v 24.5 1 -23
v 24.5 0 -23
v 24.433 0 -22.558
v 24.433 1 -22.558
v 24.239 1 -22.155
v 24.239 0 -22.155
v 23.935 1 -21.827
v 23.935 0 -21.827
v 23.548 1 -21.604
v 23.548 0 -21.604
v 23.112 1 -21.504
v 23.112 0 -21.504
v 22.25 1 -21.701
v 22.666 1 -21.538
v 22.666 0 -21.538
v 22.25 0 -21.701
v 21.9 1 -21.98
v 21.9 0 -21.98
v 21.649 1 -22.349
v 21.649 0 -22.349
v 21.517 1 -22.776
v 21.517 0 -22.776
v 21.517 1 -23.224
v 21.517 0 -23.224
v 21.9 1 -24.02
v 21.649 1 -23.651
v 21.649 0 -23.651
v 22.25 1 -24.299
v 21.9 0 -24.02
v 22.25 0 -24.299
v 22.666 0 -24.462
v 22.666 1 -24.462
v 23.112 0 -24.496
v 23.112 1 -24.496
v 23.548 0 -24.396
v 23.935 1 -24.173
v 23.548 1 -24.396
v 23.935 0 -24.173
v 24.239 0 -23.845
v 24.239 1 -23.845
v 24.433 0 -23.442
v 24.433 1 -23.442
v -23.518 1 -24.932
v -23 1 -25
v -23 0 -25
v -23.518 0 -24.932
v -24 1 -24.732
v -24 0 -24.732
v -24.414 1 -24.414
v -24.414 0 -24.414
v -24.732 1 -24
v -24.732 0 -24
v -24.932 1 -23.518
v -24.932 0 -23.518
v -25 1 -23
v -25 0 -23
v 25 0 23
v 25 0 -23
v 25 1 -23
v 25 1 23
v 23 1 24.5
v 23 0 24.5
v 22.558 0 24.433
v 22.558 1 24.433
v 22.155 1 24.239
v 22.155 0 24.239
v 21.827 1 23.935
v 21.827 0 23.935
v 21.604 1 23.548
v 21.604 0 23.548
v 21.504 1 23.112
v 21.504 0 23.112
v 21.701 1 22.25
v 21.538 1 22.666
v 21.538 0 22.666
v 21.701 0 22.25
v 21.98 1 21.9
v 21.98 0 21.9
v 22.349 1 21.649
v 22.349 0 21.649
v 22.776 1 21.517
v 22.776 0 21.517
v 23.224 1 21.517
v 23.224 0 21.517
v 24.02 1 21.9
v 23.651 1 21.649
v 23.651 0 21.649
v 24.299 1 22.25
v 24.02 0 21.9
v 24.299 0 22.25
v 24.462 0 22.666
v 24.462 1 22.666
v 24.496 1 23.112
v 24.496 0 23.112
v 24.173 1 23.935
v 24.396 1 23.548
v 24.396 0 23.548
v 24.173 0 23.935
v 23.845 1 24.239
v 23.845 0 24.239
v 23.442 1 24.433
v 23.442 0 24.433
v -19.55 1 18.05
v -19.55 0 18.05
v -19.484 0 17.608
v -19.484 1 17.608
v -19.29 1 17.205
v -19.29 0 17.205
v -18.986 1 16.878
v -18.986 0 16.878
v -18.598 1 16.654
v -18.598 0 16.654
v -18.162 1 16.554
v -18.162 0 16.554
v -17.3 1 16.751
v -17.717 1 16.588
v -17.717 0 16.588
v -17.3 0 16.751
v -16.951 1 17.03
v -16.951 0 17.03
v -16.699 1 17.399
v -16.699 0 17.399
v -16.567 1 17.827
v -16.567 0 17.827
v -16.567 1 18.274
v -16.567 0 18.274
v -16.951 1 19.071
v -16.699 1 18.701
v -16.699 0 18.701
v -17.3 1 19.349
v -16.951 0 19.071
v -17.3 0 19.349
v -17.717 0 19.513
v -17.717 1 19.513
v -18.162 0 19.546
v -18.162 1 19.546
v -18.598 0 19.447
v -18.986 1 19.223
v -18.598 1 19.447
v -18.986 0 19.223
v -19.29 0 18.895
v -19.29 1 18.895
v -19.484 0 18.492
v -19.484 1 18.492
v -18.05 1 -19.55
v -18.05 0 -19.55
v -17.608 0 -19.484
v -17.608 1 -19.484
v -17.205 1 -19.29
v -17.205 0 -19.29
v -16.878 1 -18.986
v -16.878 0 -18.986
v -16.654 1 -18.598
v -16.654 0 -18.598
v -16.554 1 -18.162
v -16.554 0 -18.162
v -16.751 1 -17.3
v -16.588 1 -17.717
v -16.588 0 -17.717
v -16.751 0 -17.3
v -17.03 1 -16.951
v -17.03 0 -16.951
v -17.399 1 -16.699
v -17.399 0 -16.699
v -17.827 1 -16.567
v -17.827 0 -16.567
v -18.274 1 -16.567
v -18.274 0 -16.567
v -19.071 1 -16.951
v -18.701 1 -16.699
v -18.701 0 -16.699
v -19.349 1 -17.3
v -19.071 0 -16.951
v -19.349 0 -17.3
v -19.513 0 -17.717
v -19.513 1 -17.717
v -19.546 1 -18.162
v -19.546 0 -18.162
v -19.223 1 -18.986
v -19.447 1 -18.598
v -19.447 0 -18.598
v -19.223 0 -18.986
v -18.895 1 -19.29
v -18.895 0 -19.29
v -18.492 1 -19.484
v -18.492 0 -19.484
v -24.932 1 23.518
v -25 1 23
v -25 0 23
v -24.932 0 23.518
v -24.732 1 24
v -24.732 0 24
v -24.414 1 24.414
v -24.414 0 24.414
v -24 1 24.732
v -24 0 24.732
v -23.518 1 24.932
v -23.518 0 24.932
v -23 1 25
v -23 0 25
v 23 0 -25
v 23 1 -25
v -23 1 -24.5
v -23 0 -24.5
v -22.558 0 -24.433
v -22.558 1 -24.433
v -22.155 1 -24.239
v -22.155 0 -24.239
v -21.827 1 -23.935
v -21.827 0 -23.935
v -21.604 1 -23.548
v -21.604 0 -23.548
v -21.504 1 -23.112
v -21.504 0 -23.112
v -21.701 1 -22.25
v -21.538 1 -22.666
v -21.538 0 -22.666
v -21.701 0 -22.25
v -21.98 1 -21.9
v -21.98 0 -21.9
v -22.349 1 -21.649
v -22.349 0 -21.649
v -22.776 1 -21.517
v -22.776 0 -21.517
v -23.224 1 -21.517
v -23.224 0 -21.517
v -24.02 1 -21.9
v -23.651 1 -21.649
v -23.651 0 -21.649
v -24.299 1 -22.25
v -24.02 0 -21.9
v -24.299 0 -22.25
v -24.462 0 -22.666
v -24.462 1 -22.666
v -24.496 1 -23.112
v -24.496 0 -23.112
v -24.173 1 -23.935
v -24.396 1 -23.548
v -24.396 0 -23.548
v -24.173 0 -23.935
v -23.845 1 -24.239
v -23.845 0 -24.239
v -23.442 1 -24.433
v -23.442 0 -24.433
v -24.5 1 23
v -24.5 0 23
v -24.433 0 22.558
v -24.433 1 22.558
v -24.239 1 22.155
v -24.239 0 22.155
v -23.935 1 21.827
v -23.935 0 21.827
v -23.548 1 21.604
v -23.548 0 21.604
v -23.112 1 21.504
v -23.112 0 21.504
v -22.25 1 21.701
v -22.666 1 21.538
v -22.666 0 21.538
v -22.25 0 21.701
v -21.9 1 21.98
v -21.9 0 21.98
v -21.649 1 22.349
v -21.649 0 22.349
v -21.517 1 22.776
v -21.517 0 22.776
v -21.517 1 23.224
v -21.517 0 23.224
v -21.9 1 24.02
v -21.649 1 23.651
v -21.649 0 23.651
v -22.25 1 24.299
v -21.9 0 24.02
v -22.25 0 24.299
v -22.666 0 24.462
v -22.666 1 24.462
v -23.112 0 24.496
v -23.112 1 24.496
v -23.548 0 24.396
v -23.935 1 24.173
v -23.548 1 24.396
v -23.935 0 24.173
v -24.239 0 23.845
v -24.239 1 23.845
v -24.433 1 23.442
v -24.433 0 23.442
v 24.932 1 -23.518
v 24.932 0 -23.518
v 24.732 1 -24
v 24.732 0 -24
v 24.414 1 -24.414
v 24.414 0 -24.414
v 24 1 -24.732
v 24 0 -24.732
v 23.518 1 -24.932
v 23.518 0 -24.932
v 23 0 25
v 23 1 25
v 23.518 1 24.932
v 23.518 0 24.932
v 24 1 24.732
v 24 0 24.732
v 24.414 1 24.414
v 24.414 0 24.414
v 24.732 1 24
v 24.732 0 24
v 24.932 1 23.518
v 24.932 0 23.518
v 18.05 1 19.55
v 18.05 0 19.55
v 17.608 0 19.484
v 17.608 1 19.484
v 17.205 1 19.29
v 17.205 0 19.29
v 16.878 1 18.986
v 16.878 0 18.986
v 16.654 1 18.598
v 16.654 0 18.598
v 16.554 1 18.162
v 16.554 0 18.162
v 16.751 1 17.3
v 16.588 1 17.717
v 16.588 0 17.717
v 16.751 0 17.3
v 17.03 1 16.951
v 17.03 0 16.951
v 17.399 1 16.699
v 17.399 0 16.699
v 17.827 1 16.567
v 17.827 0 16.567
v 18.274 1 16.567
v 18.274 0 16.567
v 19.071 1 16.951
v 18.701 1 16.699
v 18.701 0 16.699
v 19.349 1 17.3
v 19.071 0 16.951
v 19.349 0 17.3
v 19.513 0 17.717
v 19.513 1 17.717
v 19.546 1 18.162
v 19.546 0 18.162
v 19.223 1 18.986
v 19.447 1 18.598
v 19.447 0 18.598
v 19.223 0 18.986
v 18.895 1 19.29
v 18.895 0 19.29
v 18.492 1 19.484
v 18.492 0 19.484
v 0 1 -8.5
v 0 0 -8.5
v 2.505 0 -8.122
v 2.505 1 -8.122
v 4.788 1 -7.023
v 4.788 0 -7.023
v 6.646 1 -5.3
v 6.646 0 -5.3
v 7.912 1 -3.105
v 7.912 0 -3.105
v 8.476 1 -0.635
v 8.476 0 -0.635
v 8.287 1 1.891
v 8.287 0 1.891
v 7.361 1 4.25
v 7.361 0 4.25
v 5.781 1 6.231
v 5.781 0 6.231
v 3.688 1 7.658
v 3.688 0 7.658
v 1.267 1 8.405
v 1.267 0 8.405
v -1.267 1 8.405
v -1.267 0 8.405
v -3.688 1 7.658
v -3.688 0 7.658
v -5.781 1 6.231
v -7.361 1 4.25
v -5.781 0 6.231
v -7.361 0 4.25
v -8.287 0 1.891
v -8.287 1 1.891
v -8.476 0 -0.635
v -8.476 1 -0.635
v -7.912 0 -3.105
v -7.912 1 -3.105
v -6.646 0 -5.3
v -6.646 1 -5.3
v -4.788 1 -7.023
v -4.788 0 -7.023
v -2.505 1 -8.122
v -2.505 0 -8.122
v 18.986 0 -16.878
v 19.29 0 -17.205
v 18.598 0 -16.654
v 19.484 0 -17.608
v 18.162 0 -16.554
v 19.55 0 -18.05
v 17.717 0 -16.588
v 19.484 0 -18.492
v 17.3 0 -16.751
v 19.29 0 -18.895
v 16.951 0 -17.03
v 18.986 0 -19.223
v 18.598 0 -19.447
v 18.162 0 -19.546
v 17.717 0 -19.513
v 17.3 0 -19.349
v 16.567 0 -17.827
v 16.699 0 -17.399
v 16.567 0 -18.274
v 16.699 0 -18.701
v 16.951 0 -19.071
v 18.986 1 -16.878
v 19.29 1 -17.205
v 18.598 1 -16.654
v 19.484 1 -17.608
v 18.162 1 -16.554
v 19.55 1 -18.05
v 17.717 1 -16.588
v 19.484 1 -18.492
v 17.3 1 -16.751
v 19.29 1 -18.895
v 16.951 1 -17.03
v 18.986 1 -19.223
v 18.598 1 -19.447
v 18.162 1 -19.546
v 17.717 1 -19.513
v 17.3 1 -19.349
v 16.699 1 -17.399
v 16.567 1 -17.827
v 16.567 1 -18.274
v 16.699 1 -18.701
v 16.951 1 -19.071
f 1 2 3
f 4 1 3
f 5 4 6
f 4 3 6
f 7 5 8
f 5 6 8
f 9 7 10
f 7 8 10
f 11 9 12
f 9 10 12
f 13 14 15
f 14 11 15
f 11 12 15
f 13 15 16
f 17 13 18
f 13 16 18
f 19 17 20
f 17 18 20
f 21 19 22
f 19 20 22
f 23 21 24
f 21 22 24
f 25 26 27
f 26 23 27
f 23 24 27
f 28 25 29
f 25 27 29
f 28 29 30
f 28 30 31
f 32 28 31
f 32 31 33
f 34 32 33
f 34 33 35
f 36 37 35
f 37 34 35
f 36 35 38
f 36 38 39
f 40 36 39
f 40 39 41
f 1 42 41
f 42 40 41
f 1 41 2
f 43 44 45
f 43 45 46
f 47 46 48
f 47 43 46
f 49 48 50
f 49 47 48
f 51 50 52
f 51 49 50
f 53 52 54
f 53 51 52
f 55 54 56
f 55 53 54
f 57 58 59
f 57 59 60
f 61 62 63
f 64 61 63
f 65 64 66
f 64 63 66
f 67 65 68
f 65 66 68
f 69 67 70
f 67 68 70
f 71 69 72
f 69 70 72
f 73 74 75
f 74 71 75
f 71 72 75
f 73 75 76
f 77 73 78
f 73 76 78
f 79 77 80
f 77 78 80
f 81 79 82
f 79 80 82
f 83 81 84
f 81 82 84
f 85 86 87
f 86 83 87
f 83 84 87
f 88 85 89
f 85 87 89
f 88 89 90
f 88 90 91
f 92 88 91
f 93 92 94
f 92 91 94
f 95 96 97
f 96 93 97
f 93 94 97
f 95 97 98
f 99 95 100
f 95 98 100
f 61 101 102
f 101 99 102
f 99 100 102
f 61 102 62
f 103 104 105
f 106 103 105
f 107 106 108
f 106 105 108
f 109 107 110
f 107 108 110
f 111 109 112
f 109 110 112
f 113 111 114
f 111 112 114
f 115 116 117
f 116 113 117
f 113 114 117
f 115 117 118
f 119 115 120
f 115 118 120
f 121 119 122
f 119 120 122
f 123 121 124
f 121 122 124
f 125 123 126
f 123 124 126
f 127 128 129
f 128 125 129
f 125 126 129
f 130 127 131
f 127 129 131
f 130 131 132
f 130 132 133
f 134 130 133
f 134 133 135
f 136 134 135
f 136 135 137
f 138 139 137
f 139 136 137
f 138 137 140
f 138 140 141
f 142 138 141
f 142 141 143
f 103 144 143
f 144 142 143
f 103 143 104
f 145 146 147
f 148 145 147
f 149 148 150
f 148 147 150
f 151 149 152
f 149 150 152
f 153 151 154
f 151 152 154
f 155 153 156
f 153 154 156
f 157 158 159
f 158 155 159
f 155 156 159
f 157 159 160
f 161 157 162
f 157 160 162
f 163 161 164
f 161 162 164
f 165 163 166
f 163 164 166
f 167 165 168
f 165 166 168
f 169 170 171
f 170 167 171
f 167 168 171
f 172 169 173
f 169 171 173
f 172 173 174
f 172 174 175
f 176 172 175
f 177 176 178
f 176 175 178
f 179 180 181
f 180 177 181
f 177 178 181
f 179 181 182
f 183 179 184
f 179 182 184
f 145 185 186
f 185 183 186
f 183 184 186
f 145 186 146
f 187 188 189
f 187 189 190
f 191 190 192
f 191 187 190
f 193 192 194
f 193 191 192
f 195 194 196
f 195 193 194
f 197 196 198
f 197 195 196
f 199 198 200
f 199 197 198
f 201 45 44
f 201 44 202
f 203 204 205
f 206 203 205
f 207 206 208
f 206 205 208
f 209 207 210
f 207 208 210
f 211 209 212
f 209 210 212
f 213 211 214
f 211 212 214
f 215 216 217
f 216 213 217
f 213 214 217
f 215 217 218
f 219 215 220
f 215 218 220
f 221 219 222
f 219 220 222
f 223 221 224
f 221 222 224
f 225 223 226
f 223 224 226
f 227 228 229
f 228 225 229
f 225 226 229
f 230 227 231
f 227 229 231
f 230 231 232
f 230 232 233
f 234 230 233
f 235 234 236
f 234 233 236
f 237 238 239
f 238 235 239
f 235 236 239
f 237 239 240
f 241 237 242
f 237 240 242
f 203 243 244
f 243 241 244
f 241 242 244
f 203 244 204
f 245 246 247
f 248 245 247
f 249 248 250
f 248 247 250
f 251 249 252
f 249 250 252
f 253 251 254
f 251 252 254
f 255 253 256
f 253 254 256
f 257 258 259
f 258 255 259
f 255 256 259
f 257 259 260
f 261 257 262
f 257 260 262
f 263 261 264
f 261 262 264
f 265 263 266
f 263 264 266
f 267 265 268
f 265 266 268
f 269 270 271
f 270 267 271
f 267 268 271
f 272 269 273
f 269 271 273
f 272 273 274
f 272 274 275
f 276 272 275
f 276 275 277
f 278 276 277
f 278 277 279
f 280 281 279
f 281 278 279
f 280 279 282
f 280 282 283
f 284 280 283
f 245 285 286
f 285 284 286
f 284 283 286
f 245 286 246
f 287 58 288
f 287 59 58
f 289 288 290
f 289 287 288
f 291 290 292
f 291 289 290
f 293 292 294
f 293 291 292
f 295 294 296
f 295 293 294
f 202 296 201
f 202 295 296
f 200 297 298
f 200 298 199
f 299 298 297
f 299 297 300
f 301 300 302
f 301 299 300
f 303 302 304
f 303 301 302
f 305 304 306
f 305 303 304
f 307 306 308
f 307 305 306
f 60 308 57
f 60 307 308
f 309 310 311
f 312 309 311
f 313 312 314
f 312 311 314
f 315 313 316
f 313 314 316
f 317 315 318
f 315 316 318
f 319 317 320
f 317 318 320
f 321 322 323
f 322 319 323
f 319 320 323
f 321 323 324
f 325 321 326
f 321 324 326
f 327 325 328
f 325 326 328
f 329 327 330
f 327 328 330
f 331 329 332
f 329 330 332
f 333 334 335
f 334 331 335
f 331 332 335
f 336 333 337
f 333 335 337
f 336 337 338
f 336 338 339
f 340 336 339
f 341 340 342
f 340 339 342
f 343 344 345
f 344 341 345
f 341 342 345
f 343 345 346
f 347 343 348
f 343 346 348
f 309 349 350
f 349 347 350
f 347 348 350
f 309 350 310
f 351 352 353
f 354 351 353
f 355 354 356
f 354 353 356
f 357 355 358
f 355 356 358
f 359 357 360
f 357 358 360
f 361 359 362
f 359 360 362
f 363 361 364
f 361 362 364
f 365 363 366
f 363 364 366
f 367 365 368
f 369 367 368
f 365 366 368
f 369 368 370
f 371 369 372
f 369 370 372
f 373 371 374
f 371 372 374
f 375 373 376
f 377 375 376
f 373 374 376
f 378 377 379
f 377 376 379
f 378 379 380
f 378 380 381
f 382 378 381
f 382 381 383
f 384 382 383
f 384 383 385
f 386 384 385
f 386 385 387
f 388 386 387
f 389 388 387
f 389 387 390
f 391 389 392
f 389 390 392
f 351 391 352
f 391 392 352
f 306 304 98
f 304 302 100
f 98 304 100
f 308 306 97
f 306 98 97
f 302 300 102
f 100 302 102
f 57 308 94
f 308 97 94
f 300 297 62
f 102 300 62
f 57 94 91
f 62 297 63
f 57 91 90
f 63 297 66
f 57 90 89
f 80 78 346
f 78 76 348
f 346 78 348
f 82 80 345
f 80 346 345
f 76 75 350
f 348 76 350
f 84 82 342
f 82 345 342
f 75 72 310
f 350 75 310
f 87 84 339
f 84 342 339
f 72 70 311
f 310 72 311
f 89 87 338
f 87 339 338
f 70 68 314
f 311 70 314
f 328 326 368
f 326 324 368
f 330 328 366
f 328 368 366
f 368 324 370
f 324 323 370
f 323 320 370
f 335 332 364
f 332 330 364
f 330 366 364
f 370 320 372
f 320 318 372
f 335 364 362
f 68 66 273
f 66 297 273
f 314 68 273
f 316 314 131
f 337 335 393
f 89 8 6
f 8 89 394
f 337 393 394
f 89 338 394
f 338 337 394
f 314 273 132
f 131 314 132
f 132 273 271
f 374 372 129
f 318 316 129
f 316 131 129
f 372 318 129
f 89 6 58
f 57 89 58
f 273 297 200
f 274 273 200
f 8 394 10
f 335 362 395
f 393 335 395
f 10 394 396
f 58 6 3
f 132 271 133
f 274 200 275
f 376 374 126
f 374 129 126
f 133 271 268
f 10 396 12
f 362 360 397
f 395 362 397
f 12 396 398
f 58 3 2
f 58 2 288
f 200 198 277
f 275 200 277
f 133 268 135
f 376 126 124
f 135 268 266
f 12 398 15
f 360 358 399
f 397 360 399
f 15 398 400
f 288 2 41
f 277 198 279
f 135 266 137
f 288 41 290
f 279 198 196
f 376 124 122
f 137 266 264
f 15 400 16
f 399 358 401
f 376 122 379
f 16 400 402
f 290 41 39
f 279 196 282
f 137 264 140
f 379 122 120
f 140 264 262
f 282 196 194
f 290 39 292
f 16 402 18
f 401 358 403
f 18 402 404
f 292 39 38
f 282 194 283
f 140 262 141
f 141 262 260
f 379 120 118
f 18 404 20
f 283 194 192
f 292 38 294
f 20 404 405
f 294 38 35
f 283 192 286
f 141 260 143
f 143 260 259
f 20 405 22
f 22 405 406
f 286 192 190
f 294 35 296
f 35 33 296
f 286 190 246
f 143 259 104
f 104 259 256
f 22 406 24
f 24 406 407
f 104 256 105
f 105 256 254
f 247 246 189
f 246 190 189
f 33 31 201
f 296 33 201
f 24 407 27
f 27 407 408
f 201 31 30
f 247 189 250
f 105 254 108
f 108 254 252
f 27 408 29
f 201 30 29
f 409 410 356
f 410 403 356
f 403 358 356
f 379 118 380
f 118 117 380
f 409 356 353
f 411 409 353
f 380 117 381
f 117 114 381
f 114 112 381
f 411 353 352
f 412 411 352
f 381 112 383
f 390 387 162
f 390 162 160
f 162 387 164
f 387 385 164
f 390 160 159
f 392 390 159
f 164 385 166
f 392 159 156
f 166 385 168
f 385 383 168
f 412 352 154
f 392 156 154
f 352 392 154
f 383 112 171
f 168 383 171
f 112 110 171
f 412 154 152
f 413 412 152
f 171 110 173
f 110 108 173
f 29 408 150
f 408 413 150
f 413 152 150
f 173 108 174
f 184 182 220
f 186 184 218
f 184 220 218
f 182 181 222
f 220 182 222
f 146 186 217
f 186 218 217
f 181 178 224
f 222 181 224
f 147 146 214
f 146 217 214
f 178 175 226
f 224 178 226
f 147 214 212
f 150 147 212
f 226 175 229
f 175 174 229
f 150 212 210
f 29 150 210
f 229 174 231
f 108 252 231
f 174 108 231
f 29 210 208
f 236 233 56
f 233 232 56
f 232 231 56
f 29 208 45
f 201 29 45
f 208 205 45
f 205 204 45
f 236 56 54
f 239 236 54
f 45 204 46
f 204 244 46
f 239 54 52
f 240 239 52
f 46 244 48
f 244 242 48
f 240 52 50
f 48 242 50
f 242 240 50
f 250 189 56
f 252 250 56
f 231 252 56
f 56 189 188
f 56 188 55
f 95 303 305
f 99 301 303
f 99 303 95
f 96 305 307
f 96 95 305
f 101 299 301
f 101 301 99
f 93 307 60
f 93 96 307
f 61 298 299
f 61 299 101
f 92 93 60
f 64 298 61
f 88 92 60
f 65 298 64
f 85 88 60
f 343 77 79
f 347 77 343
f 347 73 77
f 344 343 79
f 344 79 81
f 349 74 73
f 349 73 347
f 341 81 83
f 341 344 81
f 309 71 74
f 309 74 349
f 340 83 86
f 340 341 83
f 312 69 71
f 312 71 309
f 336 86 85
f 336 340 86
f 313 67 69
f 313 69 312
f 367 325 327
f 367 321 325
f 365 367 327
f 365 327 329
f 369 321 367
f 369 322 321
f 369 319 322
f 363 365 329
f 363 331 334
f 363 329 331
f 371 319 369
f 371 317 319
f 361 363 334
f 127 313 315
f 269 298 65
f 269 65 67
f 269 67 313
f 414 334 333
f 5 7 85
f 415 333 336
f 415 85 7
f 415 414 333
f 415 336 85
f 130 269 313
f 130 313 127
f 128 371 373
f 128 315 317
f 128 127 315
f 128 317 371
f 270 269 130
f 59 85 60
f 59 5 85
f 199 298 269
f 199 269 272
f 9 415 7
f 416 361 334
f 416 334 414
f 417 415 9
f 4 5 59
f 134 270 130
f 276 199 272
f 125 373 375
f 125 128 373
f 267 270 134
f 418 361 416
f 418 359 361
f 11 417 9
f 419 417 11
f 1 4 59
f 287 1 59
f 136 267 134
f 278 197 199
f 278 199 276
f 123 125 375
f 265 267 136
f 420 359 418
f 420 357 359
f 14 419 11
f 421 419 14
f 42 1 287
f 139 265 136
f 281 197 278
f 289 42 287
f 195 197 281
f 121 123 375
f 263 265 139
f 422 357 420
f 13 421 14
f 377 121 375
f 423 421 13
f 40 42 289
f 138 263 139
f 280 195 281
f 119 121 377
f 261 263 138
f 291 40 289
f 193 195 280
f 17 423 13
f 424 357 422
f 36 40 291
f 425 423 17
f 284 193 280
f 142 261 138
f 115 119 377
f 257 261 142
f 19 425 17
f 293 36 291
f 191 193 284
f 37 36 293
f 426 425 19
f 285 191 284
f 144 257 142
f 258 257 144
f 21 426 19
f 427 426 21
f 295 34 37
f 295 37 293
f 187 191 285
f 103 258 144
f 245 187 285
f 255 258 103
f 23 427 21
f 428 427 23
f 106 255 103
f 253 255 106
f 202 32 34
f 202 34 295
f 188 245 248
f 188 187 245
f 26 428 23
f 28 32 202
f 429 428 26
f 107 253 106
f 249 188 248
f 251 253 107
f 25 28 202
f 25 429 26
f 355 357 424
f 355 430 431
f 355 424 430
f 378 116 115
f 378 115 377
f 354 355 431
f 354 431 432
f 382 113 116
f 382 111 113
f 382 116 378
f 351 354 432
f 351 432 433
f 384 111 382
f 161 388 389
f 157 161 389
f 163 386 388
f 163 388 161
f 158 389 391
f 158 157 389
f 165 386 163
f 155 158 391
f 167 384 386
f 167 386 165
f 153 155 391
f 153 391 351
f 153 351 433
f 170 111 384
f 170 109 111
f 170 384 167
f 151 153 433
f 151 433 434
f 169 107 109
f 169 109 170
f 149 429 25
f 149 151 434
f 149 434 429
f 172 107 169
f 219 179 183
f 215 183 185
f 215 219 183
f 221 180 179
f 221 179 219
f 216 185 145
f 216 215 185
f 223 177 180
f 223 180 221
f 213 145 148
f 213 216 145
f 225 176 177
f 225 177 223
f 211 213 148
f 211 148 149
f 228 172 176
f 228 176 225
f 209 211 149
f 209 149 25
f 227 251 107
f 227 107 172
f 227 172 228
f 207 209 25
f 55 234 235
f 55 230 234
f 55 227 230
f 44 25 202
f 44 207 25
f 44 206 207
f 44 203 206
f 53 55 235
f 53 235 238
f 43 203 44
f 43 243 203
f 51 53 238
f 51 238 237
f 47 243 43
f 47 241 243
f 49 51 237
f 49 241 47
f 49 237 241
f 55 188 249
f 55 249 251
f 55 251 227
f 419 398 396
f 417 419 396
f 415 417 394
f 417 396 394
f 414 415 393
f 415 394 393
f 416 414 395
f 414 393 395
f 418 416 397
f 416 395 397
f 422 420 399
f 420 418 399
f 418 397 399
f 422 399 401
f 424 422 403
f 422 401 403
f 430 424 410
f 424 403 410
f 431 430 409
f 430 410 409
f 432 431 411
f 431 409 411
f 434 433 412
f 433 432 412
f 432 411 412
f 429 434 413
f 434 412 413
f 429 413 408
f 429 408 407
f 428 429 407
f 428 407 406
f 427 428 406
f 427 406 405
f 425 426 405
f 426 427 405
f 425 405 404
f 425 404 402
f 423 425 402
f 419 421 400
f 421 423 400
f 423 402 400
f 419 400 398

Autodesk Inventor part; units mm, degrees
ref_plane "YZ Plane" through (0, 0, 0) normal (1, 0, 0) x (0, 1, 0)
ref_plane "XZ Plane" through (0, 0, 0) normal (0, 1, 0) x (-1, 0, 0)
ref_plane "XY Plane" through (0, 0, 0) normal (0, 0, 1) x (1, 0, 0)
sketch "Sketch1" plane through (0, 0, 0) normal (0, 1, 0) x (-1, 0, 0)
  line L0 (0, 25) -> (25, 25)
  line L1 (25, 25) -> (25, 0)
  line L2 (25, 25) -> (23, 25)
  line L3 (25, 23) -> (25, 25)
  circle A0 centre (23, 23) radius 1.5
  circle A1 centre (18.0503, 18.0503) radius 1.5
  line L4 (0, 25) -> (0, 8.5)
  line L5 (8.5, 0) -> (25, 0)
  arc A2 (8.5, 0) -> (0, 8.5) centre (0, 0) ccw
  dimension "d5" = 3
  dimension "d7" = 3
extrude "Extrusion1" add sketch "Sketch1" along normal blind 1
pattern_circular "Circular Pattern1" count 4 over 360 about axis through (0, 0, 0) along (0, 1, 0) of "Extrusion1"
fillet "Fillet1" radius 2 4 edges at (-25, 0.5, 25) (-25, 0.5, -25) (25, 0.5, 25) (25, 0.5, -25)
properties part number "POWER_distribution"
